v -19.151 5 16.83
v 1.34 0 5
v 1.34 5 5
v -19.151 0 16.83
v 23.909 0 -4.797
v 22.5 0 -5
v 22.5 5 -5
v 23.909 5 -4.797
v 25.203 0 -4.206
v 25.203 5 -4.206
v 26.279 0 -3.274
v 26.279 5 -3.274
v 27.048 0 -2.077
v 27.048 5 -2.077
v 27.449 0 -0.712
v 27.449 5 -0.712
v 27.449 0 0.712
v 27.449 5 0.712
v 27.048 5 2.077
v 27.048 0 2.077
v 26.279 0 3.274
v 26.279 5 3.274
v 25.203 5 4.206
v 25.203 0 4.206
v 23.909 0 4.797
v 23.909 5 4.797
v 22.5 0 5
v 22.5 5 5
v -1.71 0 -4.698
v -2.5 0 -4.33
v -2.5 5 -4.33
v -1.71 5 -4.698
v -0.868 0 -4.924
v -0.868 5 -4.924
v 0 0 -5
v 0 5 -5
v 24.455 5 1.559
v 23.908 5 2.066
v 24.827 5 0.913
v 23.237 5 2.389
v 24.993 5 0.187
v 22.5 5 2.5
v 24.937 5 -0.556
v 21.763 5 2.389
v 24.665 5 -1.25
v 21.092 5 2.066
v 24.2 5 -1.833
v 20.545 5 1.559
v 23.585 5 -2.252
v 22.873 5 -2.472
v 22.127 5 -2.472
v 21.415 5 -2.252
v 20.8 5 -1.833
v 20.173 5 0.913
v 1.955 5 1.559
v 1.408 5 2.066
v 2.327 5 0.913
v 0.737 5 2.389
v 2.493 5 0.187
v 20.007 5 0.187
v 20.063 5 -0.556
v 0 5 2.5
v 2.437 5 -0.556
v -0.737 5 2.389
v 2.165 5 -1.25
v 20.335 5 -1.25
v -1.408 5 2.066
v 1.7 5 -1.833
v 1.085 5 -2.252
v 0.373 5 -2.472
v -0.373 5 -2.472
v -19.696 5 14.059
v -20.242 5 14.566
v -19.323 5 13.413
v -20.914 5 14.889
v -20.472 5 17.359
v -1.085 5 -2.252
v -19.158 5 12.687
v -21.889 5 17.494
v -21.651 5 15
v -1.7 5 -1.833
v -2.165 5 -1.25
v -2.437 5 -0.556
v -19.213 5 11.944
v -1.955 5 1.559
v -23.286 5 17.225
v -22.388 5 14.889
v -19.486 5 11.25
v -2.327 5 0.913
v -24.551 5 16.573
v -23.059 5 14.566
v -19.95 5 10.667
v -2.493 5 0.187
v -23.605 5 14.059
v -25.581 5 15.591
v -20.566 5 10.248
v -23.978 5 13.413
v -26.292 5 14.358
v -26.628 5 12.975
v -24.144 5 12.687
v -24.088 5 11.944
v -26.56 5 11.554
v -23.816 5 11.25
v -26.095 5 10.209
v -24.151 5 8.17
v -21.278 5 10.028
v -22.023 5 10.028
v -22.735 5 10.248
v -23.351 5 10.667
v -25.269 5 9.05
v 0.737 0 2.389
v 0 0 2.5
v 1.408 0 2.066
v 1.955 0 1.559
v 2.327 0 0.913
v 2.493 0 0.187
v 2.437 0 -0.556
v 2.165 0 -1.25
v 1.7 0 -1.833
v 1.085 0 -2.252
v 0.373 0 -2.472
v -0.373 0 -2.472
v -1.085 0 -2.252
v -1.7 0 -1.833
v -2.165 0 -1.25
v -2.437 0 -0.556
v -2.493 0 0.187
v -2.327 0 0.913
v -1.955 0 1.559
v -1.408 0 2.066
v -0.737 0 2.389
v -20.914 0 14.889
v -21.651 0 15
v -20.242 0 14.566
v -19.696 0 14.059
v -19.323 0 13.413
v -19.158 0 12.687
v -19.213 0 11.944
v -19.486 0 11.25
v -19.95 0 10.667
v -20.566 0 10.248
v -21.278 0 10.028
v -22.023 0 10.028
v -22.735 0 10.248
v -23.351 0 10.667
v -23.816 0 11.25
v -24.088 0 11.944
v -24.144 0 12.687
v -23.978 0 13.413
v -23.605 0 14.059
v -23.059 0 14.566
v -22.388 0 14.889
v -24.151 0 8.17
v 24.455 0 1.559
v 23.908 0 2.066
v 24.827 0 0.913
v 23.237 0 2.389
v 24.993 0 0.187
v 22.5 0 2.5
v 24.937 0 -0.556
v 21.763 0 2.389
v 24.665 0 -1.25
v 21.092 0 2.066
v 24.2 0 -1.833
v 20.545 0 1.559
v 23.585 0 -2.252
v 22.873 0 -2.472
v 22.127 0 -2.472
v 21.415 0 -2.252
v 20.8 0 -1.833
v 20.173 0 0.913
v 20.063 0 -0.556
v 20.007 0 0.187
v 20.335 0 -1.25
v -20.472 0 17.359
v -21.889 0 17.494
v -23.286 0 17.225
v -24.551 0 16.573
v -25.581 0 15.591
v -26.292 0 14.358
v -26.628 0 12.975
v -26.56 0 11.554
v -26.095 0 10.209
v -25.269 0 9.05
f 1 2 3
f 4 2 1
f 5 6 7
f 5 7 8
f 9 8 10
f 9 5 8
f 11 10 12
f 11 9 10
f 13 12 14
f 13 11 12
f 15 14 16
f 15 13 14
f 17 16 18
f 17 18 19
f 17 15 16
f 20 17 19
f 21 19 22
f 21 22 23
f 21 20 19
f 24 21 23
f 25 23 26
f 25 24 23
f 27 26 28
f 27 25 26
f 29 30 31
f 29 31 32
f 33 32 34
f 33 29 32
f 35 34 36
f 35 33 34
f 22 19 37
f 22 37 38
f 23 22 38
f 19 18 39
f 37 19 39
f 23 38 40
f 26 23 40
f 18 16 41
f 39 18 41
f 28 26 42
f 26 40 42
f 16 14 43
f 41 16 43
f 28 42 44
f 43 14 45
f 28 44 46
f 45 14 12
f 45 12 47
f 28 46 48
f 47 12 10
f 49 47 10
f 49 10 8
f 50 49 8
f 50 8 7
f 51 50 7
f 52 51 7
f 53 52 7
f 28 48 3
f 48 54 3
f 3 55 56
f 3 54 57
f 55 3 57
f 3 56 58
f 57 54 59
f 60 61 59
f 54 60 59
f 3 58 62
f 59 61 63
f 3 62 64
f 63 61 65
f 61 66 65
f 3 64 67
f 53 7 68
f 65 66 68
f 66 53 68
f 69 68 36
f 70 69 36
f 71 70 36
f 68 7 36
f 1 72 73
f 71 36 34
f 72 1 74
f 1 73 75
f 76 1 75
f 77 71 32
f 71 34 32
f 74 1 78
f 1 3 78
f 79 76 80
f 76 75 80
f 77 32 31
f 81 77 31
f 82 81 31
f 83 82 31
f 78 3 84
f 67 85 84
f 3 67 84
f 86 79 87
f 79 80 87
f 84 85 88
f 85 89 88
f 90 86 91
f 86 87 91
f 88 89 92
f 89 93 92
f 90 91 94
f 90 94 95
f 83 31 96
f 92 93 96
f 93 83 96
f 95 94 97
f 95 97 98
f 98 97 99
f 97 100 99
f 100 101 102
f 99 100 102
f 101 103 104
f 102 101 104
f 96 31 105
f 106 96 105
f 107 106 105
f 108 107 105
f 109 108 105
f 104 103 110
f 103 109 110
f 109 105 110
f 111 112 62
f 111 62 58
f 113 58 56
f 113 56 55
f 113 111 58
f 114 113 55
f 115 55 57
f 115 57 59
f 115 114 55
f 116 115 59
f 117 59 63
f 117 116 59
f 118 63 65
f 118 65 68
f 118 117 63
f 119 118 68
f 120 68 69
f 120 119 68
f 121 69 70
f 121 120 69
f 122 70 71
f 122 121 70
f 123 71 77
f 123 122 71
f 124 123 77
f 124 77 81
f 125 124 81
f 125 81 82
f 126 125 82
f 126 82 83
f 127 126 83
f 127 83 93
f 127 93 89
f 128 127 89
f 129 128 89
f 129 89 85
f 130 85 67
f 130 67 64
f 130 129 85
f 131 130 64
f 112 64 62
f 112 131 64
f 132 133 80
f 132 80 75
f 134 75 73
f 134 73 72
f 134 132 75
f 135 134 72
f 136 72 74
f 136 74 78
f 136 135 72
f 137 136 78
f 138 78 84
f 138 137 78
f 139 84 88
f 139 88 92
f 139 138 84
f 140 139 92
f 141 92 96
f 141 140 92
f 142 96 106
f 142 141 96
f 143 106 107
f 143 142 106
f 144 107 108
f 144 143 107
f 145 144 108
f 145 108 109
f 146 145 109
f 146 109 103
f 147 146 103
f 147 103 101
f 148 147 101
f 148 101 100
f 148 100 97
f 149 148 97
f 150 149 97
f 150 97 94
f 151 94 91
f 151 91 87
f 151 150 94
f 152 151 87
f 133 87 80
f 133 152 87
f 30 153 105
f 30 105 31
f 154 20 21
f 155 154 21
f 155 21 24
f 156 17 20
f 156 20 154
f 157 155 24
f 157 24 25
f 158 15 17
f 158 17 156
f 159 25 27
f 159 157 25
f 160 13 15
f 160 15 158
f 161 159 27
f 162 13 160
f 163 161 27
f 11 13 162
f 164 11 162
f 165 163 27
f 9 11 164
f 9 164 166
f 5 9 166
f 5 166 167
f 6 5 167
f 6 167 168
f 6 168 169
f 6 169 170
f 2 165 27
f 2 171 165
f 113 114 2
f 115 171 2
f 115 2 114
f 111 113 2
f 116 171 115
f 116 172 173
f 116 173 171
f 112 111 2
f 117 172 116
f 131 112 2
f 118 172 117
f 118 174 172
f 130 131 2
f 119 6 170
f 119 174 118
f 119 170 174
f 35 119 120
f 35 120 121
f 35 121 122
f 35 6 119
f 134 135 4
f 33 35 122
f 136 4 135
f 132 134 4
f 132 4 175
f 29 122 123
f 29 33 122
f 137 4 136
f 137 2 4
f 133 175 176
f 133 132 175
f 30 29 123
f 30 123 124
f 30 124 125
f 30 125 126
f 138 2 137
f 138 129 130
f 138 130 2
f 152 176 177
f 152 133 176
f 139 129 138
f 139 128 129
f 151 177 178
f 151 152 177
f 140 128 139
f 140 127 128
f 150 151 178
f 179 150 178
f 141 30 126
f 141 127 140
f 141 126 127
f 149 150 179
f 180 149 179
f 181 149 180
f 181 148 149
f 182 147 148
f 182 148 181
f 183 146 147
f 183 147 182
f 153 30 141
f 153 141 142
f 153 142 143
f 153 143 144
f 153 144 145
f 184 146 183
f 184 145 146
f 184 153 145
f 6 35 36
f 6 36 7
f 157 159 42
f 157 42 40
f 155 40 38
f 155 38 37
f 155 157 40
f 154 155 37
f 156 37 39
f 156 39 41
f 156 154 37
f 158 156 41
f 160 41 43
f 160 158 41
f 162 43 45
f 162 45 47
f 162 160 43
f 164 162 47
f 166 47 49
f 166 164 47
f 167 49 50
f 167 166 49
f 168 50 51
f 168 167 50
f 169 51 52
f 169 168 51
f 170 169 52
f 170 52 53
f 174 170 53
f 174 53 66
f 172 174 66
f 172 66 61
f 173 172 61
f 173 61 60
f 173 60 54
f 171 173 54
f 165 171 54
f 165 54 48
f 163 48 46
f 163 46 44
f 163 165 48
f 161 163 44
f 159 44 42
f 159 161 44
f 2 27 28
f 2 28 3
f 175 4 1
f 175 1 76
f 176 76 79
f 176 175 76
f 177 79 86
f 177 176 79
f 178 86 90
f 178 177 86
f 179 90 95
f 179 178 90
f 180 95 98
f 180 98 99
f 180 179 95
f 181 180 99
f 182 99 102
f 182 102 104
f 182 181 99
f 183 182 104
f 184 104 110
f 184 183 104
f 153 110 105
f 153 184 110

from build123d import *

# Parameters (mm, degrees)
SKETCH1_R           = 2.5
BOSS_EXTRUDE1_DEPTH = 5
BOSS_EXTRUDE2_START = -5
SKETCH2_R           = 2.5
BOSS_EXTRUDE2_DEPTH = 5


with BuildPart() as part:
    # Sketch1 → Boss-Extrude1 (new body)
    with BuildSketch(Plane(origin=(0, 0, 0), x_dir=(1, 0, 0), z_dir=(0, 1, 0))):
        with BuildLine():
            Line((0, 5), (22.5, 5))
            ThreePointArc((22.5, 5), (27.5, 0), (22.5, -5))
            Line((22.5, -5), (0, -5))
            ThreePointArc((0, -5), (-5, 0), (0, 5))
        make_face()
        with Locations(Location((0, 0, 0), (0, 0, 270))):
            Circle(SKETCH1_R, mode=Mode.SUBTRACT)
        with Locations(Location((22.5, 0, 0), (0, 0, 270))):
            Circle(SKETCH1_R, mode=Mode.SUBTRACT)
    extrude(amount=BOSS_EXTRUDE1_DEPTH)

    # Sketch2 → Boss-Extrude2 (add)
    with BuildSketch(Plane(origin=(0, 5, 0), x_dir=(1, 0, 0), z_dir=(0, 1, 0)).offset(BOSS_EXTRUDE2_START)):
        with BuildLine():
            Line((2.5, -4.330127019), (-19.150635095, -16.830127019))
            ThreePointArc((-19.150635095, -16.830127019), (-25.980762114, -15), (-24.150635095, -8.169872981))
            Line((-24.150635095, -8.169872981), (-2.5, 4.330127019))
            ThreePointArc((-2.5, 4.330127019), (4.330127019, 2.5), (2.5, -4.330127019))
        make_face()
        with Locations(Location((-21.650635095, -12.5, 0), (0, 0, 270))):
            Circle(SKETCH2_R, mode=Mode.SUBTRACT)
        with Locations(Location((0, 0, 0), (0, 0, 270))):
            Circle(SKETCH2_R, mode=Mode.SUBTRACT)
    extrude(amount=BOSS_EXTRUDE2_DEPTH)


solid = part.part
